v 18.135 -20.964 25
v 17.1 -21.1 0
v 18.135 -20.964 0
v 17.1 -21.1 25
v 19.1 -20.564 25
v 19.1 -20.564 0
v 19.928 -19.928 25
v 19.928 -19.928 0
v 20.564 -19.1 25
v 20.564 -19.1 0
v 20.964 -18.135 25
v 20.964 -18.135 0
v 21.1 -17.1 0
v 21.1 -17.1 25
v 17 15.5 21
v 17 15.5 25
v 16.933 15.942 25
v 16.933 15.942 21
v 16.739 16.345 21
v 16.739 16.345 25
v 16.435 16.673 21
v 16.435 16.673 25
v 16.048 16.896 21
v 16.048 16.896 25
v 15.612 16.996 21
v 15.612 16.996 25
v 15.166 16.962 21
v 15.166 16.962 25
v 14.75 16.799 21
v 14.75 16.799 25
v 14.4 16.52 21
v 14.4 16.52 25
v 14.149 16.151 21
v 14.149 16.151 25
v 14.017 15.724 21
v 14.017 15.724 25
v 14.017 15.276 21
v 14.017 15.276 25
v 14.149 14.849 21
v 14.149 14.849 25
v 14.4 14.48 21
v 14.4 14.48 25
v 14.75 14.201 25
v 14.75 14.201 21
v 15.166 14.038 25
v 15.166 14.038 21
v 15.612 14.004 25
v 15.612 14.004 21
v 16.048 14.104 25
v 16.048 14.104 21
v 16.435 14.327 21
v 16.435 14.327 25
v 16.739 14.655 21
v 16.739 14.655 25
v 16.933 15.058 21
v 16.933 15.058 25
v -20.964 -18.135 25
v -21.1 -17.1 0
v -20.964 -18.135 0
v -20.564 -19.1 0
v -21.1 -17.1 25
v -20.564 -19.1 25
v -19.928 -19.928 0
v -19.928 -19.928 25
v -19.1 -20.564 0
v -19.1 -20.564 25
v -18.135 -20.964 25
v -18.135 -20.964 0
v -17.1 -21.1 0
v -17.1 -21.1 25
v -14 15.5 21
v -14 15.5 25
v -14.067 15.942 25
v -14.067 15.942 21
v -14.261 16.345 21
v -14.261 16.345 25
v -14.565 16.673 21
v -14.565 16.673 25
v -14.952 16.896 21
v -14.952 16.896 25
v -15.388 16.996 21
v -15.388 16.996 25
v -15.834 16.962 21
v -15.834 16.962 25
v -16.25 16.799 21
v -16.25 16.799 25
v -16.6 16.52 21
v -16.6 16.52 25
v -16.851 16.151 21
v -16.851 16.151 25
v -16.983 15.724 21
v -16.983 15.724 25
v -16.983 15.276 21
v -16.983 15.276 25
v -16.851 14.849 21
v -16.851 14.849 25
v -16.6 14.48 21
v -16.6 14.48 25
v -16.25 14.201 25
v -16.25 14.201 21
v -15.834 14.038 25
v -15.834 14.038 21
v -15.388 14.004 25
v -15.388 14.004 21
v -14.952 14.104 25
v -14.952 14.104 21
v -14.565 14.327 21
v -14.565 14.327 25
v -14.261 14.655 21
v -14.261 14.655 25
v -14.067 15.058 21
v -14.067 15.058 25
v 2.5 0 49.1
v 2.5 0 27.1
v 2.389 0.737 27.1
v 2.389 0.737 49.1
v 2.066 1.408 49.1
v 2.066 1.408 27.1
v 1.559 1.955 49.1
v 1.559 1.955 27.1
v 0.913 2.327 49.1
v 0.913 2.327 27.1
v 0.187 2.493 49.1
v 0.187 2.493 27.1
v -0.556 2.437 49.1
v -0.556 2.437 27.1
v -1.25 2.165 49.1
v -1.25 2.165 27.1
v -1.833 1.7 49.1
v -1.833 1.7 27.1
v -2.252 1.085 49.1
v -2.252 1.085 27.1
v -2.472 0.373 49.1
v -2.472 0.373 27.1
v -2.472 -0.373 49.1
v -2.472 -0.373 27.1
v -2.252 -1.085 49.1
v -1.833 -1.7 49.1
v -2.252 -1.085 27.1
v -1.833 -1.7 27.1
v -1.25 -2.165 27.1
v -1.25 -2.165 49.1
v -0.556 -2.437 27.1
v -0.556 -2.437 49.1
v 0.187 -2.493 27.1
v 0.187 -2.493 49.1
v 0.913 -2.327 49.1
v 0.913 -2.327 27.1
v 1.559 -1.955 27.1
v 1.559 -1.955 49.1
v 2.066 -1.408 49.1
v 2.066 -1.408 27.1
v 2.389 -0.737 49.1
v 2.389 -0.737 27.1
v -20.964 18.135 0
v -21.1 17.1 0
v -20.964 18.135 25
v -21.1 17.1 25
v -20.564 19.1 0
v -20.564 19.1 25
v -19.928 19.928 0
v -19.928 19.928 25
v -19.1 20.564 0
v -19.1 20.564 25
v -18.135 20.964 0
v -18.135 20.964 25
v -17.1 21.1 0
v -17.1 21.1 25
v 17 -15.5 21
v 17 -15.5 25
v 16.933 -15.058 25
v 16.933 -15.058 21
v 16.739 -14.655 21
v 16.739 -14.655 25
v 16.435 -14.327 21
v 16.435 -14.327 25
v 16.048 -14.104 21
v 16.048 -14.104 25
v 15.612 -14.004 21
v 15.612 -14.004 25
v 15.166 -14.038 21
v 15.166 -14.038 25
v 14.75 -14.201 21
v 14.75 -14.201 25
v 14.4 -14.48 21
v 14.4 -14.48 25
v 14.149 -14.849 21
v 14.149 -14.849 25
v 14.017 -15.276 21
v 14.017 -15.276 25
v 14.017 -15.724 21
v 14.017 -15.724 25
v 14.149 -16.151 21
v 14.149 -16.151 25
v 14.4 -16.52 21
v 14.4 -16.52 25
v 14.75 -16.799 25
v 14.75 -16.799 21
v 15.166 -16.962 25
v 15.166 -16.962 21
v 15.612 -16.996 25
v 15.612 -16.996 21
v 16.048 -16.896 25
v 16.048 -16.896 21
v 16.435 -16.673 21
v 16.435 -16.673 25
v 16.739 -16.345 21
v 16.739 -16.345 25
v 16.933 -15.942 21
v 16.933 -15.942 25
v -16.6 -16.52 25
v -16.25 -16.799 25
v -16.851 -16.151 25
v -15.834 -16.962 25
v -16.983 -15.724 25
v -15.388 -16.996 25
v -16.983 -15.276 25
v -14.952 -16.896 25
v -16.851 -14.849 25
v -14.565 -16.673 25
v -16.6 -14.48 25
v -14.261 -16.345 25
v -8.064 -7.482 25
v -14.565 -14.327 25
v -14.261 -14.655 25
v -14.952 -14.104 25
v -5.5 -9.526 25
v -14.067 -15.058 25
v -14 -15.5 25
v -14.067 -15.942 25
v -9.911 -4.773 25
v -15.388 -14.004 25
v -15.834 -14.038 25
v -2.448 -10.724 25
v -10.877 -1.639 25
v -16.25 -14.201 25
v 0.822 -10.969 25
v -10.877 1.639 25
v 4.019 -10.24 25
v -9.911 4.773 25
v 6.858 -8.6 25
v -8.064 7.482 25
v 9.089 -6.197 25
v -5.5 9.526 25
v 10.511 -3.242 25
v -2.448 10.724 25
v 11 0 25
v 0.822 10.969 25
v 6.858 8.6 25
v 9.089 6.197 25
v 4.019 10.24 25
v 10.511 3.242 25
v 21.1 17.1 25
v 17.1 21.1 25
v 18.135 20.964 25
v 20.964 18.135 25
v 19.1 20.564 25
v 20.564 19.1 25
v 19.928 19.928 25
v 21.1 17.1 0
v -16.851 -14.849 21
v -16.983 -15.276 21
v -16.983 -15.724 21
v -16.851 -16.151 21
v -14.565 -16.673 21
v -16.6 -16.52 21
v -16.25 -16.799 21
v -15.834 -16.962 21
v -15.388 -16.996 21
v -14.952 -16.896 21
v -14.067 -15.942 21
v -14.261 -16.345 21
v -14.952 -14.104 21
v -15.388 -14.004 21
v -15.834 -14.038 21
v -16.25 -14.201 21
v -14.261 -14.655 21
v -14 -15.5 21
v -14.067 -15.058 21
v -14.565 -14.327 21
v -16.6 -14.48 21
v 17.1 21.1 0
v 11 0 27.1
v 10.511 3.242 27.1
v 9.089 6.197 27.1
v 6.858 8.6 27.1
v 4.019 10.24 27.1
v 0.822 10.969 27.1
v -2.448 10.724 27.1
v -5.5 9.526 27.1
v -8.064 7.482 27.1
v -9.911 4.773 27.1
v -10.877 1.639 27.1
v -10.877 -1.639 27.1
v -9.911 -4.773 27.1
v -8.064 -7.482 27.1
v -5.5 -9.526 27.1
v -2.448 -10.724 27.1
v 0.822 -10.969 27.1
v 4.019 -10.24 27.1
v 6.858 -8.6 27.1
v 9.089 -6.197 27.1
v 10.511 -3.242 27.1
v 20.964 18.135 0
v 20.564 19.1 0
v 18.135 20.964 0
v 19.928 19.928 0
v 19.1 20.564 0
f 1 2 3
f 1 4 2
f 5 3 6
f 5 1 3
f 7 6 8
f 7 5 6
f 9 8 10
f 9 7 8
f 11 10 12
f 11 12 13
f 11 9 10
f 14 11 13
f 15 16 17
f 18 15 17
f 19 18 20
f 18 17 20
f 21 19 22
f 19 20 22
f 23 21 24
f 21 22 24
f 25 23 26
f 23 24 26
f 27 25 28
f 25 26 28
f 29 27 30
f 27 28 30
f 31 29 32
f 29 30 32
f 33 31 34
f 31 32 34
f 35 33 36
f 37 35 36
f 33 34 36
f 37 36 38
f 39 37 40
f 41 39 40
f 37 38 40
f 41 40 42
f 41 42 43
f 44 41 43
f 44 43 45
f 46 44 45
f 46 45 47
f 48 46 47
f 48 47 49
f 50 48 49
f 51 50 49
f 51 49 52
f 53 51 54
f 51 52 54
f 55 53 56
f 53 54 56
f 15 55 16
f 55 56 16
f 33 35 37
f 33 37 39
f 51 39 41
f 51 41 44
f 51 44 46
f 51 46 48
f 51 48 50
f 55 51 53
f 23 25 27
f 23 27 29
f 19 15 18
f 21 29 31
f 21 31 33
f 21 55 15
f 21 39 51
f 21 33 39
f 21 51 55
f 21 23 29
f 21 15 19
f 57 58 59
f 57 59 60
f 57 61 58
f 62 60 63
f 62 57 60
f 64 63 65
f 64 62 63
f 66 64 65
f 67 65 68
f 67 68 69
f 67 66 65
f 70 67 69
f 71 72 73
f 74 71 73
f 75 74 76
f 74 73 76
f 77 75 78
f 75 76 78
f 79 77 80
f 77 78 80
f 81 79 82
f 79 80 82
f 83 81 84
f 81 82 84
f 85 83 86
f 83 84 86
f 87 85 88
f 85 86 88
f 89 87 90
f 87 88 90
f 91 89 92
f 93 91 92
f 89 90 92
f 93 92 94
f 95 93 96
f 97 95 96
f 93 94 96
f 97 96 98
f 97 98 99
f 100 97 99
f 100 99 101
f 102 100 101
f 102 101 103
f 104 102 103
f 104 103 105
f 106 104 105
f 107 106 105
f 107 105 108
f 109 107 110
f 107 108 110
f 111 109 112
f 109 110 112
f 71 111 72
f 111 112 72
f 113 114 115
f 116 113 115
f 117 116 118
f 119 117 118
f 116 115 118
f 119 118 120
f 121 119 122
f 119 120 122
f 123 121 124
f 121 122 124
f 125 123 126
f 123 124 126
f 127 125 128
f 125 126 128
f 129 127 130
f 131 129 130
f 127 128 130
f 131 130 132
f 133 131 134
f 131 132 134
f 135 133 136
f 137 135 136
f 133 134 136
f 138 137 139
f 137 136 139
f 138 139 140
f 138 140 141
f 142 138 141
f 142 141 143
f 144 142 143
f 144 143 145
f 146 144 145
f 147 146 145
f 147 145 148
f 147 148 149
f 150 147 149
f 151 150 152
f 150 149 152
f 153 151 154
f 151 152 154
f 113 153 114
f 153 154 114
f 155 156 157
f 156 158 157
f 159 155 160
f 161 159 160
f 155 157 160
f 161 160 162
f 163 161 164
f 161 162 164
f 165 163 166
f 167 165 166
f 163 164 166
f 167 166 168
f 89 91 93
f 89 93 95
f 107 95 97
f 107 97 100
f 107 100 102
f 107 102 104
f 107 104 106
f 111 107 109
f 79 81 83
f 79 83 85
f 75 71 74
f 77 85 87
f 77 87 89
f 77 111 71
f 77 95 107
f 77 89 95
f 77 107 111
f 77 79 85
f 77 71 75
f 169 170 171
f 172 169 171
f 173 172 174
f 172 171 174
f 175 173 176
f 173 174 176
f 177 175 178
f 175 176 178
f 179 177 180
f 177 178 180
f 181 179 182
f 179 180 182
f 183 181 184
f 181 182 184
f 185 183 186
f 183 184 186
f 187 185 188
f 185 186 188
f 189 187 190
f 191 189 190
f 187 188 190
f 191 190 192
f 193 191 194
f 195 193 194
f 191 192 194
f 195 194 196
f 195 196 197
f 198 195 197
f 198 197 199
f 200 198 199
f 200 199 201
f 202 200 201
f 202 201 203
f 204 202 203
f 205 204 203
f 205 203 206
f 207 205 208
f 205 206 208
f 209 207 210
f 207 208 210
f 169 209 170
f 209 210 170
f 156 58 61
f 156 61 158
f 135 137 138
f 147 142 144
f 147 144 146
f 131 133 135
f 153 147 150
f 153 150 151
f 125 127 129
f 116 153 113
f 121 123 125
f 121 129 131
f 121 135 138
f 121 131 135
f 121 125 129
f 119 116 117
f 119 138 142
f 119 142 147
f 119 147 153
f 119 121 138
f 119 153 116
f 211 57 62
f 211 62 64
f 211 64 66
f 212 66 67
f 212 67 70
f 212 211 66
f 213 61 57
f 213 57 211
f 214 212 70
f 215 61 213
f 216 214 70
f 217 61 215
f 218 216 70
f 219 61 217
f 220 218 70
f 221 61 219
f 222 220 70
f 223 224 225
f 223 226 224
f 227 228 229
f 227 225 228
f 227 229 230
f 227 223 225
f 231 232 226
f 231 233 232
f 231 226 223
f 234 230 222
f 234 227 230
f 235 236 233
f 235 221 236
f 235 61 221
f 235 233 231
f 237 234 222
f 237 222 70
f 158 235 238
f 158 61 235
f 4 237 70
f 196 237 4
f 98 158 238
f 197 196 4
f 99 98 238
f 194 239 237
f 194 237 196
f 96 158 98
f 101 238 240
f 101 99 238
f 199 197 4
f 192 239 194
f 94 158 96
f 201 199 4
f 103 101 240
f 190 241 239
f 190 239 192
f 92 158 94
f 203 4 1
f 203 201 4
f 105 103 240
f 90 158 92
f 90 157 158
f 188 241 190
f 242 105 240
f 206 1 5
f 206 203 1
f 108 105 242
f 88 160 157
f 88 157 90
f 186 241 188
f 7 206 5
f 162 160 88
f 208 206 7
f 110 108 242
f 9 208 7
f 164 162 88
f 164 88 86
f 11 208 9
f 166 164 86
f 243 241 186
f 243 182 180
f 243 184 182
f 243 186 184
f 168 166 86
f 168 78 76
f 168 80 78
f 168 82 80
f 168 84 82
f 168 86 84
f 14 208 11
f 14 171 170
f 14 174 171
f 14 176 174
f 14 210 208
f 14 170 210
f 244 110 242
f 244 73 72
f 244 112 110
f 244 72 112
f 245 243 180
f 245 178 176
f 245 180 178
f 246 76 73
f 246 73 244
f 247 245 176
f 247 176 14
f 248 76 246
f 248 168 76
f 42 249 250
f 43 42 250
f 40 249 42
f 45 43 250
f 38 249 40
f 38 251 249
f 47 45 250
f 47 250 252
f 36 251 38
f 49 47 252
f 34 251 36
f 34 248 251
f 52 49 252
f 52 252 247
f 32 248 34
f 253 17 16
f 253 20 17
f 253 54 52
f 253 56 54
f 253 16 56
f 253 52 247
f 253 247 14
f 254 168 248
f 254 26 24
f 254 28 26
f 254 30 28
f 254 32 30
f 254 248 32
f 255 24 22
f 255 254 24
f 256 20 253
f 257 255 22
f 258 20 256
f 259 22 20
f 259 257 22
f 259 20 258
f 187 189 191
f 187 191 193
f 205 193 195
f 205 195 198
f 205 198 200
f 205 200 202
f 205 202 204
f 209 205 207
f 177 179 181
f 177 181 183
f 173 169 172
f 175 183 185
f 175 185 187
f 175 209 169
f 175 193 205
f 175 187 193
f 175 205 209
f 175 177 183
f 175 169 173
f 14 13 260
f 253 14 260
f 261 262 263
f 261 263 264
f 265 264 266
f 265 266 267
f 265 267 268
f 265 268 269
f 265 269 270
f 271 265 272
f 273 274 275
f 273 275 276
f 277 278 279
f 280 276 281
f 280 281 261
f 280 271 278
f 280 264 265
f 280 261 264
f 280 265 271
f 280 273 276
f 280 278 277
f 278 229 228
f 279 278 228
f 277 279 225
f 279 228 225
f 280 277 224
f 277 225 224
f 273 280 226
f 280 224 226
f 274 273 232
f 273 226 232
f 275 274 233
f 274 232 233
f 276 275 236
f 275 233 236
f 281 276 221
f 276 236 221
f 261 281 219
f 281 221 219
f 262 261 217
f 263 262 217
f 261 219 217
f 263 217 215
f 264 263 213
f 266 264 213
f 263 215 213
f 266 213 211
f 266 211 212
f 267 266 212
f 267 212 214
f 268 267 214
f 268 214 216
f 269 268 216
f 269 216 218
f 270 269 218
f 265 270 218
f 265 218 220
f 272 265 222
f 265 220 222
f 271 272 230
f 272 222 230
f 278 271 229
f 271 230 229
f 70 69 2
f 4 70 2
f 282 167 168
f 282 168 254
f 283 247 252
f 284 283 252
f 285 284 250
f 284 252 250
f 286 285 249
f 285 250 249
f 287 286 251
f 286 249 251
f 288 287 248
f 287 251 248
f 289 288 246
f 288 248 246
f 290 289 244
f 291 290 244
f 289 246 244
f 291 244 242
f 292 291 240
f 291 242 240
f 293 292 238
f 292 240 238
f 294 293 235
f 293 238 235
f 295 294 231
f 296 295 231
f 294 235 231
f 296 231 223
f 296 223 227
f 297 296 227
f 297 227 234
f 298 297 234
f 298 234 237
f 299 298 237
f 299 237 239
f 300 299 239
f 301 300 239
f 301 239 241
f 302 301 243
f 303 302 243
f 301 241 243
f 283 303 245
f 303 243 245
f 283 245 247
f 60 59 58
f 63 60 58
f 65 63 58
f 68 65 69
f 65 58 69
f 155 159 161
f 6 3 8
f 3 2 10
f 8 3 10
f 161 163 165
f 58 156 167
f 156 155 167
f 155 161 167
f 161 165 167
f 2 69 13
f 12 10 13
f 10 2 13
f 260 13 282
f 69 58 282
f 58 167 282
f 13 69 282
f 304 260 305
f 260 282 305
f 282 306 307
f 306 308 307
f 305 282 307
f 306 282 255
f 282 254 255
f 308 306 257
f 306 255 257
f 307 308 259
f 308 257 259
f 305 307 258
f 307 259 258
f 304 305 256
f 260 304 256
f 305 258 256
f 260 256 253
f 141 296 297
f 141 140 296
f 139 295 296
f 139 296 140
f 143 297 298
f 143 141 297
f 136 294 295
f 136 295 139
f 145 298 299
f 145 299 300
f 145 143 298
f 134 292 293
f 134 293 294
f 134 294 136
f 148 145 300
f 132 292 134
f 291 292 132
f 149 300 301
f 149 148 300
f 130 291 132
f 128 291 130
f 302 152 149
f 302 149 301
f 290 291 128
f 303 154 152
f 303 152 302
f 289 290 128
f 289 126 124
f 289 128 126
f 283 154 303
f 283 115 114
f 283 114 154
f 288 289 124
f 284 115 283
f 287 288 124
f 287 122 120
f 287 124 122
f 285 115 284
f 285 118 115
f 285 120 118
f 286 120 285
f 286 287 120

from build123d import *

# Parameters (mm, degrees)
SKIZZE1_W                       = 42.2
SKIZZE1_H                       = 42.2
AUFSATZ_LINEAR_AUSTRAGEN1_DEPTH = 25
SKIZZE2_R                       = 11
AUFSATZ_LINEAR_AUSTRAGEN2_DEPTH = 2.1
SKIZZE3_R                       = 2.5
AUFSATZ_LINEAR_AUSTRAGEN3_DEPTH = 22
SKIZZE4_R                       = 1.5
SCHNITT_LINEAR_AUSTRAGEN1_DEPTH = 4
FILLET1_R                       = 4


with BuildPart() as part:
    # Skizze1 → Aufsatz-Linear austragen1 (new body)
    with BuildSketch(Plane.XY):
        Rectangle(SKIZZE1_W, SKIZZE1_H)
    extrude(amount=AUFSATZ_LINEAR_AUSTRAGEN1_DEPTH)

    # Skizze2 → Aufsatz-Linear austragen2 (add)
    with BuildSketch(Plane.XY.offset(25)):
        Circle(SKIZZE2_R)
    extrude(amount=AUFSATZ_LINEAR_AUSTRAGEN2_DEPTH)

    # Skizze3 → Aufsatz-Linear austragen3 (add)
    with BuildSketch(Plane.XY.offset(27.1)):
        Circle(SKIZZE3_R)
    extrude(amount=AUFSATZ_LINEAR_AUSTRAGEN3_DEPTH)

    # Skizze4 → Schnitt-Linear austragen1 (cut)
    with BuildSketch(Plane.XY.offset(25)):
        with Locations((-15.5, 15.5)):
            Circle(SKIZZE4_R)
        with Locations((15.5, 15.5)):
            Circle(SKIZZE4_R)
        with Locations((15.5, -15.5)):
            Circle(SKIZZE4_R)
        with Locations((-15.5, -15.5)):
            Circle(SKIZZE4_R)
    extrude(amount=-SCHNITT_LINEAR_AUSTRAGEN1_DEPTH, mode=Mode.SUBTRACT)

    # Fillet1
    fillet1_edges = [part.edges().sort_by_distance(p)[0] for p in [
        (21.1, -21.1, 12.5),
        (-21.1, -21.1, 12.5),
        (-21.1, 21.1, 12.5),
        (21.1, 21.1, 12.5),
    ]]
    fillet(fillet1_edges, radius=FILLET1_R)


solid = part.part
